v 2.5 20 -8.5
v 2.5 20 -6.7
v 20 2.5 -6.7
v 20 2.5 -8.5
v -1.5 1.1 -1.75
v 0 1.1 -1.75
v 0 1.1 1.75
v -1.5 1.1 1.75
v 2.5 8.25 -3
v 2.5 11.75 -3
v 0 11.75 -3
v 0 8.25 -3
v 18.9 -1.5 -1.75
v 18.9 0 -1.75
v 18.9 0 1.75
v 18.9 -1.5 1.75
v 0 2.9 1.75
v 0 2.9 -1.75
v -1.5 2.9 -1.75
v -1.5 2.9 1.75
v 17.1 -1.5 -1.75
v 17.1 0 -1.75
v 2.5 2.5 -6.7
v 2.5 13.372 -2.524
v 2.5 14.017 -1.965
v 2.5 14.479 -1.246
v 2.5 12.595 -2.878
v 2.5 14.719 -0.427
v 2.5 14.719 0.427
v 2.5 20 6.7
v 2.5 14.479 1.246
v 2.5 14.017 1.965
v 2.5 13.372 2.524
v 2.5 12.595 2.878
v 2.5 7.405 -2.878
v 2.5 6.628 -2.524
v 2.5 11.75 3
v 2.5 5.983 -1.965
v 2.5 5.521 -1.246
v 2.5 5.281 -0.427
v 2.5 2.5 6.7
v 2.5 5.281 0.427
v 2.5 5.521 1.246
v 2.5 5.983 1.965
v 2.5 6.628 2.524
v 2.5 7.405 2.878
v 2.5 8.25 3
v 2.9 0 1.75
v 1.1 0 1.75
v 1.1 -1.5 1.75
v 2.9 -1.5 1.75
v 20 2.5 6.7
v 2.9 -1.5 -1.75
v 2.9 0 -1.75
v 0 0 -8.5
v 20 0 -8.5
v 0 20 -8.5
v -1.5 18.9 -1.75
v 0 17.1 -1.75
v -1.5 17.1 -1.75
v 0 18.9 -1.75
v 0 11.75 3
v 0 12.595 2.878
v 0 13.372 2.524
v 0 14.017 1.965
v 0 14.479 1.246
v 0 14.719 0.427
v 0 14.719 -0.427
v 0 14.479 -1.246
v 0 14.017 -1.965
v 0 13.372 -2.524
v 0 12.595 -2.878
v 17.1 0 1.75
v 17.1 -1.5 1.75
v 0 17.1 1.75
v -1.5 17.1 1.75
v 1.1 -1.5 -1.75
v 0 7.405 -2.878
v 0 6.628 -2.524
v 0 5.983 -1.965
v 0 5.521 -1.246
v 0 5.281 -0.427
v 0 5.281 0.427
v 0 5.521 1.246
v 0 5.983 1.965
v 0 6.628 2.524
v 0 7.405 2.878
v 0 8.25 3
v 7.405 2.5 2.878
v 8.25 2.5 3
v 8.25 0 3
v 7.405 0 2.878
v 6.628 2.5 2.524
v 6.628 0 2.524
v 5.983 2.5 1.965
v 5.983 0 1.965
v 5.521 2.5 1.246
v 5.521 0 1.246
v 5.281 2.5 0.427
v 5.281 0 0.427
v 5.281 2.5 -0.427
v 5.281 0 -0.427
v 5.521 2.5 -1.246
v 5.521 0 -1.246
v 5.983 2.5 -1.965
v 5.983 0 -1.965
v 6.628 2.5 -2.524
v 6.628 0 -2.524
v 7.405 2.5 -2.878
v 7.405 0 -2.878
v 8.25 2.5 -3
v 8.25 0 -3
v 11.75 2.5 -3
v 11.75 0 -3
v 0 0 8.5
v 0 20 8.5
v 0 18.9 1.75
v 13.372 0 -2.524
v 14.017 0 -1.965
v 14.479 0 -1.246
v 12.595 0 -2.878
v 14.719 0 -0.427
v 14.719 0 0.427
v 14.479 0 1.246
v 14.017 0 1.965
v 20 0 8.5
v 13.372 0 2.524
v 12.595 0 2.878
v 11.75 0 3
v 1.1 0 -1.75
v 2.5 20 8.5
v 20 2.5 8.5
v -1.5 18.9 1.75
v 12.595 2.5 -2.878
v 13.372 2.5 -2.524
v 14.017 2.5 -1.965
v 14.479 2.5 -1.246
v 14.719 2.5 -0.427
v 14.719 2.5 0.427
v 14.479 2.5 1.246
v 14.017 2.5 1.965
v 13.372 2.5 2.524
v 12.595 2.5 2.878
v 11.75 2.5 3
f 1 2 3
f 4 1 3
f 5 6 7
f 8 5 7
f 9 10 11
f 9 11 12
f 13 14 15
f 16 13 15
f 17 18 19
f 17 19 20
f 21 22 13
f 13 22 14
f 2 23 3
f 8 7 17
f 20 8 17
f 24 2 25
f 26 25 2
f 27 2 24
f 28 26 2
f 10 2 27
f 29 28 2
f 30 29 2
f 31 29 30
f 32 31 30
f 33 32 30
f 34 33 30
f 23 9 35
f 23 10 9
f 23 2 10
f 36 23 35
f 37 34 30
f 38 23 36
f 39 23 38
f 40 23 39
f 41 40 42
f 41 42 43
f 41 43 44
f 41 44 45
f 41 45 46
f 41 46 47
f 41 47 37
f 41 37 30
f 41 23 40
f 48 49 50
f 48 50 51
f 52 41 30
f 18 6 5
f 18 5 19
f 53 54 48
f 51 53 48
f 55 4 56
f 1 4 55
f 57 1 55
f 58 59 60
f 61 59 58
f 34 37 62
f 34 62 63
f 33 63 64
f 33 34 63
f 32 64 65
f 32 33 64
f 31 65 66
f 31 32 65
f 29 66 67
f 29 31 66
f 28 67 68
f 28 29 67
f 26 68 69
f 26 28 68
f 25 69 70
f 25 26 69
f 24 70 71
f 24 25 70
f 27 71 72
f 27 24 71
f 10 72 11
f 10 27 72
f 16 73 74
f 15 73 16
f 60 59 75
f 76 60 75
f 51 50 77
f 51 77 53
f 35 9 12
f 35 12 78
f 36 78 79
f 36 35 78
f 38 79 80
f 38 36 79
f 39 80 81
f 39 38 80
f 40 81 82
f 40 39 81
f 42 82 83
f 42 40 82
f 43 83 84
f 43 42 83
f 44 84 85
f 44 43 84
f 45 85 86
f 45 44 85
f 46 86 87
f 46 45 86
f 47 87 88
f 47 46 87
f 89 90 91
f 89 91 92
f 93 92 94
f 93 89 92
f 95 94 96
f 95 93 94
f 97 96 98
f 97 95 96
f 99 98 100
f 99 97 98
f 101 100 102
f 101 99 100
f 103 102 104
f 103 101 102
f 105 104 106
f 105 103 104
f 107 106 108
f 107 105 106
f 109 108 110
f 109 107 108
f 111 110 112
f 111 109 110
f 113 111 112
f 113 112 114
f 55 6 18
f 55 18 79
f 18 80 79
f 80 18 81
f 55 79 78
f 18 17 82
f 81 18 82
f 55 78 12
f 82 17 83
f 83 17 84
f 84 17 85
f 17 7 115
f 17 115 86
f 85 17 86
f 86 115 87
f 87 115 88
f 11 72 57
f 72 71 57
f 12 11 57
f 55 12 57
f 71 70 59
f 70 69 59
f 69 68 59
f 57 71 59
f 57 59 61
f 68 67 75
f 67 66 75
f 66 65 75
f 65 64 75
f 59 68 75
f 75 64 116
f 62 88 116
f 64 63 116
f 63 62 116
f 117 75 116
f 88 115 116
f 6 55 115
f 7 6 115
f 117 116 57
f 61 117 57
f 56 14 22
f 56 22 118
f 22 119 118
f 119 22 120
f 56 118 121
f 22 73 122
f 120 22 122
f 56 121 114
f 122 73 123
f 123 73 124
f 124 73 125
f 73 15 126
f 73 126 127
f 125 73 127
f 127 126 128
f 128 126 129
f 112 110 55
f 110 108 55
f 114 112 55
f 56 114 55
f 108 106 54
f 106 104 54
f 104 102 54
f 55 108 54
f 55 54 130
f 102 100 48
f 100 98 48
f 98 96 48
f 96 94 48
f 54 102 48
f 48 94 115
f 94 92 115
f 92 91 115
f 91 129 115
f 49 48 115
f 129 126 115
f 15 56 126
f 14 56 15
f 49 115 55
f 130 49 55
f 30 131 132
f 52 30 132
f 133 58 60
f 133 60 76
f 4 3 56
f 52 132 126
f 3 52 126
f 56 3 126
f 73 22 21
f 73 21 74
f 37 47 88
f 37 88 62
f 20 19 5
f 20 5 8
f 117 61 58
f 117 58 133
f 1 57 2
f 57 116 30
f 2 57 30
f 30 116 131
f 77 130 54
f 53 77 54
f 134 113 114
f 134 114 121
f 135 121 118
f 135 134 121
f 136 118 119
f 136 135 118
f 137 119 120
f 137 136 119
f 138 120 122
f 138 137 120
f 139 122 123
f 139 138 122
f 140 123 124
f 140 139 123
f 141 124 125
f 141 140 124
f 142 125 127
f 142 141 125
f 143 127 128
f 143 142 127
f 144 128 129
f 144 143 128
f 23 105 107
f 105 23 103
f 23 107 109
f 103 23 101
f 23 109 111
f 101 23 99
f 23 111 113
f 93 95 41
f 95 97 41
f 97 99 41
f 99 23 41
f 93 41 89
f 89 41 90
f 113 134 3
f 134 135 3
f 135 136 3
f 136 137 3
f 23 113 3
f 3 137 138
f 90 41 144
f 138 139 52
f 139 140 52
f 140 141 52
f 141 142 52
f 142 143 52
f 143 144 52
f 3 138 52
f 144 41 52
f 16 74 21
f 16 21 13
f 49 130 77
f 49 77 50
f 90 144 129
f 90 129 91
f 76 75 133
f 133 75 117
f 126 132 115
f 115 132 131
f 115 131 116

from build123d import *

# Parameters (mm, degrees)
BOSS_EXTRUDE1_DEPTH = 8.5
CUT_EXTRUDE2_START  = -2.5
SKETCH2_W           = 17.5
SKETCH2_H           = 13.4
CUT_EXTRUDE2_DEPTH  = 28.033878851
CUT_EXTRUDE3_DEPTH  = 17
CUT_EXTRUDE4_DEPTH  = 17
SKETCH5_W           = 1.8
SKETCH5_H           = 3.5
BOSS_EXTRUDE2_DEPTH = 1.5
SKETCH6_W           = 3.5
SKETCH6_H           = 1.8
BOSS_EXTRUDE3_DEPTH = 1.5


with BuildPart() as part:
    # Sketch1 → Boss-Extrude1 (new, symmetric)
    with BuildSketch(Plane.XY):
        Polygon((0, 20), (2.5, 20), (20, 2.5), (20, 0), (0, 0), align=None)
    extrude(amount=BOSS_EXTRUDE1_DEPTH, both=True)

    # Sketch2 → Cut-Extrude2 (cut, through all)
    with BuildSketch(Plane.XZ.offset(CUT_EXTRUDE2_START)):
        with Locations((11.25, 0)):
            Rectangle(SKETCH2_W, SKETCH2_H)
    extrude(amount=-CUT_EXTRUDE2_DEPTH, mode=Mode.SUBTRACT)

    # Sketch3 → Cut-Extrude3 (cut)
    with BuildSketch(Plane(origin=(0, 2.5, 0), x_dir=(1, 0, 0), z_dir=(0, 1, 0))):
        with BuildLine():
            Line((8.25, 3), (11.75, 3))
            ThreePointArc((11.75, 3), (14.75, 0), (11.75, -3))
            Line((11.75, -3), (8.25, -3))
            ThreePointArc((8.25, -3), (5.25, 0), (8.25, 3))
        make_face()
    extrude(amount=-CUT_EXTRUDE3_DEPTH, mode=Mode.SUBTRACT)

    # Sketch4 → Cut-Extrude4 (cut)
    with BuildSketch(Plane(origin=(2.5, 0, 0), x_dir=(0, 0, -1), z_dir=(1, 0, 0))):
        with BuildLine():
            Line((-3, 8.25), (-3, 11.75))
            ThreePointArc((-3, 11.75), (0, 14.75), (3, 11.75))
            Line((3, 11.75), (3, 8.25))
            ThreePointArc((3, 8.25), (0, 5.25), (-3, 8.25))
        make_face()
    extrude(amount=-CUT_EXTRUDE4_DEPTH, mode=Mode.SUBTRACT)

    # Sketch5 → Boss-Extrude2 (add)
    with BuildSketch(Plane.XZ):
        with Locations((2, 0)):
            Rectangle(SKETCH5_W, SKETCH5_H)
        with Locations((18, 0)):
            Rectangle(SKETCH5_W, SKETCH5_H)
    extrude(amount=BOSS_EXTRUDE2_DEPTH)

    # Sketch6 → Boss-Extrude3 (add)
    with BuildSketch(Plane.ZY):
        with Locations((0, 2)):
            Rectangle(SKETCH6_W, SKETCH6_H)
        with Locations((0, 18)):
            Rectangle(SKETCH6_W, SKETCH6_H)
    extrude(amount=BOSS_EXTRUDE3_DEPTH)


solid = part.part
